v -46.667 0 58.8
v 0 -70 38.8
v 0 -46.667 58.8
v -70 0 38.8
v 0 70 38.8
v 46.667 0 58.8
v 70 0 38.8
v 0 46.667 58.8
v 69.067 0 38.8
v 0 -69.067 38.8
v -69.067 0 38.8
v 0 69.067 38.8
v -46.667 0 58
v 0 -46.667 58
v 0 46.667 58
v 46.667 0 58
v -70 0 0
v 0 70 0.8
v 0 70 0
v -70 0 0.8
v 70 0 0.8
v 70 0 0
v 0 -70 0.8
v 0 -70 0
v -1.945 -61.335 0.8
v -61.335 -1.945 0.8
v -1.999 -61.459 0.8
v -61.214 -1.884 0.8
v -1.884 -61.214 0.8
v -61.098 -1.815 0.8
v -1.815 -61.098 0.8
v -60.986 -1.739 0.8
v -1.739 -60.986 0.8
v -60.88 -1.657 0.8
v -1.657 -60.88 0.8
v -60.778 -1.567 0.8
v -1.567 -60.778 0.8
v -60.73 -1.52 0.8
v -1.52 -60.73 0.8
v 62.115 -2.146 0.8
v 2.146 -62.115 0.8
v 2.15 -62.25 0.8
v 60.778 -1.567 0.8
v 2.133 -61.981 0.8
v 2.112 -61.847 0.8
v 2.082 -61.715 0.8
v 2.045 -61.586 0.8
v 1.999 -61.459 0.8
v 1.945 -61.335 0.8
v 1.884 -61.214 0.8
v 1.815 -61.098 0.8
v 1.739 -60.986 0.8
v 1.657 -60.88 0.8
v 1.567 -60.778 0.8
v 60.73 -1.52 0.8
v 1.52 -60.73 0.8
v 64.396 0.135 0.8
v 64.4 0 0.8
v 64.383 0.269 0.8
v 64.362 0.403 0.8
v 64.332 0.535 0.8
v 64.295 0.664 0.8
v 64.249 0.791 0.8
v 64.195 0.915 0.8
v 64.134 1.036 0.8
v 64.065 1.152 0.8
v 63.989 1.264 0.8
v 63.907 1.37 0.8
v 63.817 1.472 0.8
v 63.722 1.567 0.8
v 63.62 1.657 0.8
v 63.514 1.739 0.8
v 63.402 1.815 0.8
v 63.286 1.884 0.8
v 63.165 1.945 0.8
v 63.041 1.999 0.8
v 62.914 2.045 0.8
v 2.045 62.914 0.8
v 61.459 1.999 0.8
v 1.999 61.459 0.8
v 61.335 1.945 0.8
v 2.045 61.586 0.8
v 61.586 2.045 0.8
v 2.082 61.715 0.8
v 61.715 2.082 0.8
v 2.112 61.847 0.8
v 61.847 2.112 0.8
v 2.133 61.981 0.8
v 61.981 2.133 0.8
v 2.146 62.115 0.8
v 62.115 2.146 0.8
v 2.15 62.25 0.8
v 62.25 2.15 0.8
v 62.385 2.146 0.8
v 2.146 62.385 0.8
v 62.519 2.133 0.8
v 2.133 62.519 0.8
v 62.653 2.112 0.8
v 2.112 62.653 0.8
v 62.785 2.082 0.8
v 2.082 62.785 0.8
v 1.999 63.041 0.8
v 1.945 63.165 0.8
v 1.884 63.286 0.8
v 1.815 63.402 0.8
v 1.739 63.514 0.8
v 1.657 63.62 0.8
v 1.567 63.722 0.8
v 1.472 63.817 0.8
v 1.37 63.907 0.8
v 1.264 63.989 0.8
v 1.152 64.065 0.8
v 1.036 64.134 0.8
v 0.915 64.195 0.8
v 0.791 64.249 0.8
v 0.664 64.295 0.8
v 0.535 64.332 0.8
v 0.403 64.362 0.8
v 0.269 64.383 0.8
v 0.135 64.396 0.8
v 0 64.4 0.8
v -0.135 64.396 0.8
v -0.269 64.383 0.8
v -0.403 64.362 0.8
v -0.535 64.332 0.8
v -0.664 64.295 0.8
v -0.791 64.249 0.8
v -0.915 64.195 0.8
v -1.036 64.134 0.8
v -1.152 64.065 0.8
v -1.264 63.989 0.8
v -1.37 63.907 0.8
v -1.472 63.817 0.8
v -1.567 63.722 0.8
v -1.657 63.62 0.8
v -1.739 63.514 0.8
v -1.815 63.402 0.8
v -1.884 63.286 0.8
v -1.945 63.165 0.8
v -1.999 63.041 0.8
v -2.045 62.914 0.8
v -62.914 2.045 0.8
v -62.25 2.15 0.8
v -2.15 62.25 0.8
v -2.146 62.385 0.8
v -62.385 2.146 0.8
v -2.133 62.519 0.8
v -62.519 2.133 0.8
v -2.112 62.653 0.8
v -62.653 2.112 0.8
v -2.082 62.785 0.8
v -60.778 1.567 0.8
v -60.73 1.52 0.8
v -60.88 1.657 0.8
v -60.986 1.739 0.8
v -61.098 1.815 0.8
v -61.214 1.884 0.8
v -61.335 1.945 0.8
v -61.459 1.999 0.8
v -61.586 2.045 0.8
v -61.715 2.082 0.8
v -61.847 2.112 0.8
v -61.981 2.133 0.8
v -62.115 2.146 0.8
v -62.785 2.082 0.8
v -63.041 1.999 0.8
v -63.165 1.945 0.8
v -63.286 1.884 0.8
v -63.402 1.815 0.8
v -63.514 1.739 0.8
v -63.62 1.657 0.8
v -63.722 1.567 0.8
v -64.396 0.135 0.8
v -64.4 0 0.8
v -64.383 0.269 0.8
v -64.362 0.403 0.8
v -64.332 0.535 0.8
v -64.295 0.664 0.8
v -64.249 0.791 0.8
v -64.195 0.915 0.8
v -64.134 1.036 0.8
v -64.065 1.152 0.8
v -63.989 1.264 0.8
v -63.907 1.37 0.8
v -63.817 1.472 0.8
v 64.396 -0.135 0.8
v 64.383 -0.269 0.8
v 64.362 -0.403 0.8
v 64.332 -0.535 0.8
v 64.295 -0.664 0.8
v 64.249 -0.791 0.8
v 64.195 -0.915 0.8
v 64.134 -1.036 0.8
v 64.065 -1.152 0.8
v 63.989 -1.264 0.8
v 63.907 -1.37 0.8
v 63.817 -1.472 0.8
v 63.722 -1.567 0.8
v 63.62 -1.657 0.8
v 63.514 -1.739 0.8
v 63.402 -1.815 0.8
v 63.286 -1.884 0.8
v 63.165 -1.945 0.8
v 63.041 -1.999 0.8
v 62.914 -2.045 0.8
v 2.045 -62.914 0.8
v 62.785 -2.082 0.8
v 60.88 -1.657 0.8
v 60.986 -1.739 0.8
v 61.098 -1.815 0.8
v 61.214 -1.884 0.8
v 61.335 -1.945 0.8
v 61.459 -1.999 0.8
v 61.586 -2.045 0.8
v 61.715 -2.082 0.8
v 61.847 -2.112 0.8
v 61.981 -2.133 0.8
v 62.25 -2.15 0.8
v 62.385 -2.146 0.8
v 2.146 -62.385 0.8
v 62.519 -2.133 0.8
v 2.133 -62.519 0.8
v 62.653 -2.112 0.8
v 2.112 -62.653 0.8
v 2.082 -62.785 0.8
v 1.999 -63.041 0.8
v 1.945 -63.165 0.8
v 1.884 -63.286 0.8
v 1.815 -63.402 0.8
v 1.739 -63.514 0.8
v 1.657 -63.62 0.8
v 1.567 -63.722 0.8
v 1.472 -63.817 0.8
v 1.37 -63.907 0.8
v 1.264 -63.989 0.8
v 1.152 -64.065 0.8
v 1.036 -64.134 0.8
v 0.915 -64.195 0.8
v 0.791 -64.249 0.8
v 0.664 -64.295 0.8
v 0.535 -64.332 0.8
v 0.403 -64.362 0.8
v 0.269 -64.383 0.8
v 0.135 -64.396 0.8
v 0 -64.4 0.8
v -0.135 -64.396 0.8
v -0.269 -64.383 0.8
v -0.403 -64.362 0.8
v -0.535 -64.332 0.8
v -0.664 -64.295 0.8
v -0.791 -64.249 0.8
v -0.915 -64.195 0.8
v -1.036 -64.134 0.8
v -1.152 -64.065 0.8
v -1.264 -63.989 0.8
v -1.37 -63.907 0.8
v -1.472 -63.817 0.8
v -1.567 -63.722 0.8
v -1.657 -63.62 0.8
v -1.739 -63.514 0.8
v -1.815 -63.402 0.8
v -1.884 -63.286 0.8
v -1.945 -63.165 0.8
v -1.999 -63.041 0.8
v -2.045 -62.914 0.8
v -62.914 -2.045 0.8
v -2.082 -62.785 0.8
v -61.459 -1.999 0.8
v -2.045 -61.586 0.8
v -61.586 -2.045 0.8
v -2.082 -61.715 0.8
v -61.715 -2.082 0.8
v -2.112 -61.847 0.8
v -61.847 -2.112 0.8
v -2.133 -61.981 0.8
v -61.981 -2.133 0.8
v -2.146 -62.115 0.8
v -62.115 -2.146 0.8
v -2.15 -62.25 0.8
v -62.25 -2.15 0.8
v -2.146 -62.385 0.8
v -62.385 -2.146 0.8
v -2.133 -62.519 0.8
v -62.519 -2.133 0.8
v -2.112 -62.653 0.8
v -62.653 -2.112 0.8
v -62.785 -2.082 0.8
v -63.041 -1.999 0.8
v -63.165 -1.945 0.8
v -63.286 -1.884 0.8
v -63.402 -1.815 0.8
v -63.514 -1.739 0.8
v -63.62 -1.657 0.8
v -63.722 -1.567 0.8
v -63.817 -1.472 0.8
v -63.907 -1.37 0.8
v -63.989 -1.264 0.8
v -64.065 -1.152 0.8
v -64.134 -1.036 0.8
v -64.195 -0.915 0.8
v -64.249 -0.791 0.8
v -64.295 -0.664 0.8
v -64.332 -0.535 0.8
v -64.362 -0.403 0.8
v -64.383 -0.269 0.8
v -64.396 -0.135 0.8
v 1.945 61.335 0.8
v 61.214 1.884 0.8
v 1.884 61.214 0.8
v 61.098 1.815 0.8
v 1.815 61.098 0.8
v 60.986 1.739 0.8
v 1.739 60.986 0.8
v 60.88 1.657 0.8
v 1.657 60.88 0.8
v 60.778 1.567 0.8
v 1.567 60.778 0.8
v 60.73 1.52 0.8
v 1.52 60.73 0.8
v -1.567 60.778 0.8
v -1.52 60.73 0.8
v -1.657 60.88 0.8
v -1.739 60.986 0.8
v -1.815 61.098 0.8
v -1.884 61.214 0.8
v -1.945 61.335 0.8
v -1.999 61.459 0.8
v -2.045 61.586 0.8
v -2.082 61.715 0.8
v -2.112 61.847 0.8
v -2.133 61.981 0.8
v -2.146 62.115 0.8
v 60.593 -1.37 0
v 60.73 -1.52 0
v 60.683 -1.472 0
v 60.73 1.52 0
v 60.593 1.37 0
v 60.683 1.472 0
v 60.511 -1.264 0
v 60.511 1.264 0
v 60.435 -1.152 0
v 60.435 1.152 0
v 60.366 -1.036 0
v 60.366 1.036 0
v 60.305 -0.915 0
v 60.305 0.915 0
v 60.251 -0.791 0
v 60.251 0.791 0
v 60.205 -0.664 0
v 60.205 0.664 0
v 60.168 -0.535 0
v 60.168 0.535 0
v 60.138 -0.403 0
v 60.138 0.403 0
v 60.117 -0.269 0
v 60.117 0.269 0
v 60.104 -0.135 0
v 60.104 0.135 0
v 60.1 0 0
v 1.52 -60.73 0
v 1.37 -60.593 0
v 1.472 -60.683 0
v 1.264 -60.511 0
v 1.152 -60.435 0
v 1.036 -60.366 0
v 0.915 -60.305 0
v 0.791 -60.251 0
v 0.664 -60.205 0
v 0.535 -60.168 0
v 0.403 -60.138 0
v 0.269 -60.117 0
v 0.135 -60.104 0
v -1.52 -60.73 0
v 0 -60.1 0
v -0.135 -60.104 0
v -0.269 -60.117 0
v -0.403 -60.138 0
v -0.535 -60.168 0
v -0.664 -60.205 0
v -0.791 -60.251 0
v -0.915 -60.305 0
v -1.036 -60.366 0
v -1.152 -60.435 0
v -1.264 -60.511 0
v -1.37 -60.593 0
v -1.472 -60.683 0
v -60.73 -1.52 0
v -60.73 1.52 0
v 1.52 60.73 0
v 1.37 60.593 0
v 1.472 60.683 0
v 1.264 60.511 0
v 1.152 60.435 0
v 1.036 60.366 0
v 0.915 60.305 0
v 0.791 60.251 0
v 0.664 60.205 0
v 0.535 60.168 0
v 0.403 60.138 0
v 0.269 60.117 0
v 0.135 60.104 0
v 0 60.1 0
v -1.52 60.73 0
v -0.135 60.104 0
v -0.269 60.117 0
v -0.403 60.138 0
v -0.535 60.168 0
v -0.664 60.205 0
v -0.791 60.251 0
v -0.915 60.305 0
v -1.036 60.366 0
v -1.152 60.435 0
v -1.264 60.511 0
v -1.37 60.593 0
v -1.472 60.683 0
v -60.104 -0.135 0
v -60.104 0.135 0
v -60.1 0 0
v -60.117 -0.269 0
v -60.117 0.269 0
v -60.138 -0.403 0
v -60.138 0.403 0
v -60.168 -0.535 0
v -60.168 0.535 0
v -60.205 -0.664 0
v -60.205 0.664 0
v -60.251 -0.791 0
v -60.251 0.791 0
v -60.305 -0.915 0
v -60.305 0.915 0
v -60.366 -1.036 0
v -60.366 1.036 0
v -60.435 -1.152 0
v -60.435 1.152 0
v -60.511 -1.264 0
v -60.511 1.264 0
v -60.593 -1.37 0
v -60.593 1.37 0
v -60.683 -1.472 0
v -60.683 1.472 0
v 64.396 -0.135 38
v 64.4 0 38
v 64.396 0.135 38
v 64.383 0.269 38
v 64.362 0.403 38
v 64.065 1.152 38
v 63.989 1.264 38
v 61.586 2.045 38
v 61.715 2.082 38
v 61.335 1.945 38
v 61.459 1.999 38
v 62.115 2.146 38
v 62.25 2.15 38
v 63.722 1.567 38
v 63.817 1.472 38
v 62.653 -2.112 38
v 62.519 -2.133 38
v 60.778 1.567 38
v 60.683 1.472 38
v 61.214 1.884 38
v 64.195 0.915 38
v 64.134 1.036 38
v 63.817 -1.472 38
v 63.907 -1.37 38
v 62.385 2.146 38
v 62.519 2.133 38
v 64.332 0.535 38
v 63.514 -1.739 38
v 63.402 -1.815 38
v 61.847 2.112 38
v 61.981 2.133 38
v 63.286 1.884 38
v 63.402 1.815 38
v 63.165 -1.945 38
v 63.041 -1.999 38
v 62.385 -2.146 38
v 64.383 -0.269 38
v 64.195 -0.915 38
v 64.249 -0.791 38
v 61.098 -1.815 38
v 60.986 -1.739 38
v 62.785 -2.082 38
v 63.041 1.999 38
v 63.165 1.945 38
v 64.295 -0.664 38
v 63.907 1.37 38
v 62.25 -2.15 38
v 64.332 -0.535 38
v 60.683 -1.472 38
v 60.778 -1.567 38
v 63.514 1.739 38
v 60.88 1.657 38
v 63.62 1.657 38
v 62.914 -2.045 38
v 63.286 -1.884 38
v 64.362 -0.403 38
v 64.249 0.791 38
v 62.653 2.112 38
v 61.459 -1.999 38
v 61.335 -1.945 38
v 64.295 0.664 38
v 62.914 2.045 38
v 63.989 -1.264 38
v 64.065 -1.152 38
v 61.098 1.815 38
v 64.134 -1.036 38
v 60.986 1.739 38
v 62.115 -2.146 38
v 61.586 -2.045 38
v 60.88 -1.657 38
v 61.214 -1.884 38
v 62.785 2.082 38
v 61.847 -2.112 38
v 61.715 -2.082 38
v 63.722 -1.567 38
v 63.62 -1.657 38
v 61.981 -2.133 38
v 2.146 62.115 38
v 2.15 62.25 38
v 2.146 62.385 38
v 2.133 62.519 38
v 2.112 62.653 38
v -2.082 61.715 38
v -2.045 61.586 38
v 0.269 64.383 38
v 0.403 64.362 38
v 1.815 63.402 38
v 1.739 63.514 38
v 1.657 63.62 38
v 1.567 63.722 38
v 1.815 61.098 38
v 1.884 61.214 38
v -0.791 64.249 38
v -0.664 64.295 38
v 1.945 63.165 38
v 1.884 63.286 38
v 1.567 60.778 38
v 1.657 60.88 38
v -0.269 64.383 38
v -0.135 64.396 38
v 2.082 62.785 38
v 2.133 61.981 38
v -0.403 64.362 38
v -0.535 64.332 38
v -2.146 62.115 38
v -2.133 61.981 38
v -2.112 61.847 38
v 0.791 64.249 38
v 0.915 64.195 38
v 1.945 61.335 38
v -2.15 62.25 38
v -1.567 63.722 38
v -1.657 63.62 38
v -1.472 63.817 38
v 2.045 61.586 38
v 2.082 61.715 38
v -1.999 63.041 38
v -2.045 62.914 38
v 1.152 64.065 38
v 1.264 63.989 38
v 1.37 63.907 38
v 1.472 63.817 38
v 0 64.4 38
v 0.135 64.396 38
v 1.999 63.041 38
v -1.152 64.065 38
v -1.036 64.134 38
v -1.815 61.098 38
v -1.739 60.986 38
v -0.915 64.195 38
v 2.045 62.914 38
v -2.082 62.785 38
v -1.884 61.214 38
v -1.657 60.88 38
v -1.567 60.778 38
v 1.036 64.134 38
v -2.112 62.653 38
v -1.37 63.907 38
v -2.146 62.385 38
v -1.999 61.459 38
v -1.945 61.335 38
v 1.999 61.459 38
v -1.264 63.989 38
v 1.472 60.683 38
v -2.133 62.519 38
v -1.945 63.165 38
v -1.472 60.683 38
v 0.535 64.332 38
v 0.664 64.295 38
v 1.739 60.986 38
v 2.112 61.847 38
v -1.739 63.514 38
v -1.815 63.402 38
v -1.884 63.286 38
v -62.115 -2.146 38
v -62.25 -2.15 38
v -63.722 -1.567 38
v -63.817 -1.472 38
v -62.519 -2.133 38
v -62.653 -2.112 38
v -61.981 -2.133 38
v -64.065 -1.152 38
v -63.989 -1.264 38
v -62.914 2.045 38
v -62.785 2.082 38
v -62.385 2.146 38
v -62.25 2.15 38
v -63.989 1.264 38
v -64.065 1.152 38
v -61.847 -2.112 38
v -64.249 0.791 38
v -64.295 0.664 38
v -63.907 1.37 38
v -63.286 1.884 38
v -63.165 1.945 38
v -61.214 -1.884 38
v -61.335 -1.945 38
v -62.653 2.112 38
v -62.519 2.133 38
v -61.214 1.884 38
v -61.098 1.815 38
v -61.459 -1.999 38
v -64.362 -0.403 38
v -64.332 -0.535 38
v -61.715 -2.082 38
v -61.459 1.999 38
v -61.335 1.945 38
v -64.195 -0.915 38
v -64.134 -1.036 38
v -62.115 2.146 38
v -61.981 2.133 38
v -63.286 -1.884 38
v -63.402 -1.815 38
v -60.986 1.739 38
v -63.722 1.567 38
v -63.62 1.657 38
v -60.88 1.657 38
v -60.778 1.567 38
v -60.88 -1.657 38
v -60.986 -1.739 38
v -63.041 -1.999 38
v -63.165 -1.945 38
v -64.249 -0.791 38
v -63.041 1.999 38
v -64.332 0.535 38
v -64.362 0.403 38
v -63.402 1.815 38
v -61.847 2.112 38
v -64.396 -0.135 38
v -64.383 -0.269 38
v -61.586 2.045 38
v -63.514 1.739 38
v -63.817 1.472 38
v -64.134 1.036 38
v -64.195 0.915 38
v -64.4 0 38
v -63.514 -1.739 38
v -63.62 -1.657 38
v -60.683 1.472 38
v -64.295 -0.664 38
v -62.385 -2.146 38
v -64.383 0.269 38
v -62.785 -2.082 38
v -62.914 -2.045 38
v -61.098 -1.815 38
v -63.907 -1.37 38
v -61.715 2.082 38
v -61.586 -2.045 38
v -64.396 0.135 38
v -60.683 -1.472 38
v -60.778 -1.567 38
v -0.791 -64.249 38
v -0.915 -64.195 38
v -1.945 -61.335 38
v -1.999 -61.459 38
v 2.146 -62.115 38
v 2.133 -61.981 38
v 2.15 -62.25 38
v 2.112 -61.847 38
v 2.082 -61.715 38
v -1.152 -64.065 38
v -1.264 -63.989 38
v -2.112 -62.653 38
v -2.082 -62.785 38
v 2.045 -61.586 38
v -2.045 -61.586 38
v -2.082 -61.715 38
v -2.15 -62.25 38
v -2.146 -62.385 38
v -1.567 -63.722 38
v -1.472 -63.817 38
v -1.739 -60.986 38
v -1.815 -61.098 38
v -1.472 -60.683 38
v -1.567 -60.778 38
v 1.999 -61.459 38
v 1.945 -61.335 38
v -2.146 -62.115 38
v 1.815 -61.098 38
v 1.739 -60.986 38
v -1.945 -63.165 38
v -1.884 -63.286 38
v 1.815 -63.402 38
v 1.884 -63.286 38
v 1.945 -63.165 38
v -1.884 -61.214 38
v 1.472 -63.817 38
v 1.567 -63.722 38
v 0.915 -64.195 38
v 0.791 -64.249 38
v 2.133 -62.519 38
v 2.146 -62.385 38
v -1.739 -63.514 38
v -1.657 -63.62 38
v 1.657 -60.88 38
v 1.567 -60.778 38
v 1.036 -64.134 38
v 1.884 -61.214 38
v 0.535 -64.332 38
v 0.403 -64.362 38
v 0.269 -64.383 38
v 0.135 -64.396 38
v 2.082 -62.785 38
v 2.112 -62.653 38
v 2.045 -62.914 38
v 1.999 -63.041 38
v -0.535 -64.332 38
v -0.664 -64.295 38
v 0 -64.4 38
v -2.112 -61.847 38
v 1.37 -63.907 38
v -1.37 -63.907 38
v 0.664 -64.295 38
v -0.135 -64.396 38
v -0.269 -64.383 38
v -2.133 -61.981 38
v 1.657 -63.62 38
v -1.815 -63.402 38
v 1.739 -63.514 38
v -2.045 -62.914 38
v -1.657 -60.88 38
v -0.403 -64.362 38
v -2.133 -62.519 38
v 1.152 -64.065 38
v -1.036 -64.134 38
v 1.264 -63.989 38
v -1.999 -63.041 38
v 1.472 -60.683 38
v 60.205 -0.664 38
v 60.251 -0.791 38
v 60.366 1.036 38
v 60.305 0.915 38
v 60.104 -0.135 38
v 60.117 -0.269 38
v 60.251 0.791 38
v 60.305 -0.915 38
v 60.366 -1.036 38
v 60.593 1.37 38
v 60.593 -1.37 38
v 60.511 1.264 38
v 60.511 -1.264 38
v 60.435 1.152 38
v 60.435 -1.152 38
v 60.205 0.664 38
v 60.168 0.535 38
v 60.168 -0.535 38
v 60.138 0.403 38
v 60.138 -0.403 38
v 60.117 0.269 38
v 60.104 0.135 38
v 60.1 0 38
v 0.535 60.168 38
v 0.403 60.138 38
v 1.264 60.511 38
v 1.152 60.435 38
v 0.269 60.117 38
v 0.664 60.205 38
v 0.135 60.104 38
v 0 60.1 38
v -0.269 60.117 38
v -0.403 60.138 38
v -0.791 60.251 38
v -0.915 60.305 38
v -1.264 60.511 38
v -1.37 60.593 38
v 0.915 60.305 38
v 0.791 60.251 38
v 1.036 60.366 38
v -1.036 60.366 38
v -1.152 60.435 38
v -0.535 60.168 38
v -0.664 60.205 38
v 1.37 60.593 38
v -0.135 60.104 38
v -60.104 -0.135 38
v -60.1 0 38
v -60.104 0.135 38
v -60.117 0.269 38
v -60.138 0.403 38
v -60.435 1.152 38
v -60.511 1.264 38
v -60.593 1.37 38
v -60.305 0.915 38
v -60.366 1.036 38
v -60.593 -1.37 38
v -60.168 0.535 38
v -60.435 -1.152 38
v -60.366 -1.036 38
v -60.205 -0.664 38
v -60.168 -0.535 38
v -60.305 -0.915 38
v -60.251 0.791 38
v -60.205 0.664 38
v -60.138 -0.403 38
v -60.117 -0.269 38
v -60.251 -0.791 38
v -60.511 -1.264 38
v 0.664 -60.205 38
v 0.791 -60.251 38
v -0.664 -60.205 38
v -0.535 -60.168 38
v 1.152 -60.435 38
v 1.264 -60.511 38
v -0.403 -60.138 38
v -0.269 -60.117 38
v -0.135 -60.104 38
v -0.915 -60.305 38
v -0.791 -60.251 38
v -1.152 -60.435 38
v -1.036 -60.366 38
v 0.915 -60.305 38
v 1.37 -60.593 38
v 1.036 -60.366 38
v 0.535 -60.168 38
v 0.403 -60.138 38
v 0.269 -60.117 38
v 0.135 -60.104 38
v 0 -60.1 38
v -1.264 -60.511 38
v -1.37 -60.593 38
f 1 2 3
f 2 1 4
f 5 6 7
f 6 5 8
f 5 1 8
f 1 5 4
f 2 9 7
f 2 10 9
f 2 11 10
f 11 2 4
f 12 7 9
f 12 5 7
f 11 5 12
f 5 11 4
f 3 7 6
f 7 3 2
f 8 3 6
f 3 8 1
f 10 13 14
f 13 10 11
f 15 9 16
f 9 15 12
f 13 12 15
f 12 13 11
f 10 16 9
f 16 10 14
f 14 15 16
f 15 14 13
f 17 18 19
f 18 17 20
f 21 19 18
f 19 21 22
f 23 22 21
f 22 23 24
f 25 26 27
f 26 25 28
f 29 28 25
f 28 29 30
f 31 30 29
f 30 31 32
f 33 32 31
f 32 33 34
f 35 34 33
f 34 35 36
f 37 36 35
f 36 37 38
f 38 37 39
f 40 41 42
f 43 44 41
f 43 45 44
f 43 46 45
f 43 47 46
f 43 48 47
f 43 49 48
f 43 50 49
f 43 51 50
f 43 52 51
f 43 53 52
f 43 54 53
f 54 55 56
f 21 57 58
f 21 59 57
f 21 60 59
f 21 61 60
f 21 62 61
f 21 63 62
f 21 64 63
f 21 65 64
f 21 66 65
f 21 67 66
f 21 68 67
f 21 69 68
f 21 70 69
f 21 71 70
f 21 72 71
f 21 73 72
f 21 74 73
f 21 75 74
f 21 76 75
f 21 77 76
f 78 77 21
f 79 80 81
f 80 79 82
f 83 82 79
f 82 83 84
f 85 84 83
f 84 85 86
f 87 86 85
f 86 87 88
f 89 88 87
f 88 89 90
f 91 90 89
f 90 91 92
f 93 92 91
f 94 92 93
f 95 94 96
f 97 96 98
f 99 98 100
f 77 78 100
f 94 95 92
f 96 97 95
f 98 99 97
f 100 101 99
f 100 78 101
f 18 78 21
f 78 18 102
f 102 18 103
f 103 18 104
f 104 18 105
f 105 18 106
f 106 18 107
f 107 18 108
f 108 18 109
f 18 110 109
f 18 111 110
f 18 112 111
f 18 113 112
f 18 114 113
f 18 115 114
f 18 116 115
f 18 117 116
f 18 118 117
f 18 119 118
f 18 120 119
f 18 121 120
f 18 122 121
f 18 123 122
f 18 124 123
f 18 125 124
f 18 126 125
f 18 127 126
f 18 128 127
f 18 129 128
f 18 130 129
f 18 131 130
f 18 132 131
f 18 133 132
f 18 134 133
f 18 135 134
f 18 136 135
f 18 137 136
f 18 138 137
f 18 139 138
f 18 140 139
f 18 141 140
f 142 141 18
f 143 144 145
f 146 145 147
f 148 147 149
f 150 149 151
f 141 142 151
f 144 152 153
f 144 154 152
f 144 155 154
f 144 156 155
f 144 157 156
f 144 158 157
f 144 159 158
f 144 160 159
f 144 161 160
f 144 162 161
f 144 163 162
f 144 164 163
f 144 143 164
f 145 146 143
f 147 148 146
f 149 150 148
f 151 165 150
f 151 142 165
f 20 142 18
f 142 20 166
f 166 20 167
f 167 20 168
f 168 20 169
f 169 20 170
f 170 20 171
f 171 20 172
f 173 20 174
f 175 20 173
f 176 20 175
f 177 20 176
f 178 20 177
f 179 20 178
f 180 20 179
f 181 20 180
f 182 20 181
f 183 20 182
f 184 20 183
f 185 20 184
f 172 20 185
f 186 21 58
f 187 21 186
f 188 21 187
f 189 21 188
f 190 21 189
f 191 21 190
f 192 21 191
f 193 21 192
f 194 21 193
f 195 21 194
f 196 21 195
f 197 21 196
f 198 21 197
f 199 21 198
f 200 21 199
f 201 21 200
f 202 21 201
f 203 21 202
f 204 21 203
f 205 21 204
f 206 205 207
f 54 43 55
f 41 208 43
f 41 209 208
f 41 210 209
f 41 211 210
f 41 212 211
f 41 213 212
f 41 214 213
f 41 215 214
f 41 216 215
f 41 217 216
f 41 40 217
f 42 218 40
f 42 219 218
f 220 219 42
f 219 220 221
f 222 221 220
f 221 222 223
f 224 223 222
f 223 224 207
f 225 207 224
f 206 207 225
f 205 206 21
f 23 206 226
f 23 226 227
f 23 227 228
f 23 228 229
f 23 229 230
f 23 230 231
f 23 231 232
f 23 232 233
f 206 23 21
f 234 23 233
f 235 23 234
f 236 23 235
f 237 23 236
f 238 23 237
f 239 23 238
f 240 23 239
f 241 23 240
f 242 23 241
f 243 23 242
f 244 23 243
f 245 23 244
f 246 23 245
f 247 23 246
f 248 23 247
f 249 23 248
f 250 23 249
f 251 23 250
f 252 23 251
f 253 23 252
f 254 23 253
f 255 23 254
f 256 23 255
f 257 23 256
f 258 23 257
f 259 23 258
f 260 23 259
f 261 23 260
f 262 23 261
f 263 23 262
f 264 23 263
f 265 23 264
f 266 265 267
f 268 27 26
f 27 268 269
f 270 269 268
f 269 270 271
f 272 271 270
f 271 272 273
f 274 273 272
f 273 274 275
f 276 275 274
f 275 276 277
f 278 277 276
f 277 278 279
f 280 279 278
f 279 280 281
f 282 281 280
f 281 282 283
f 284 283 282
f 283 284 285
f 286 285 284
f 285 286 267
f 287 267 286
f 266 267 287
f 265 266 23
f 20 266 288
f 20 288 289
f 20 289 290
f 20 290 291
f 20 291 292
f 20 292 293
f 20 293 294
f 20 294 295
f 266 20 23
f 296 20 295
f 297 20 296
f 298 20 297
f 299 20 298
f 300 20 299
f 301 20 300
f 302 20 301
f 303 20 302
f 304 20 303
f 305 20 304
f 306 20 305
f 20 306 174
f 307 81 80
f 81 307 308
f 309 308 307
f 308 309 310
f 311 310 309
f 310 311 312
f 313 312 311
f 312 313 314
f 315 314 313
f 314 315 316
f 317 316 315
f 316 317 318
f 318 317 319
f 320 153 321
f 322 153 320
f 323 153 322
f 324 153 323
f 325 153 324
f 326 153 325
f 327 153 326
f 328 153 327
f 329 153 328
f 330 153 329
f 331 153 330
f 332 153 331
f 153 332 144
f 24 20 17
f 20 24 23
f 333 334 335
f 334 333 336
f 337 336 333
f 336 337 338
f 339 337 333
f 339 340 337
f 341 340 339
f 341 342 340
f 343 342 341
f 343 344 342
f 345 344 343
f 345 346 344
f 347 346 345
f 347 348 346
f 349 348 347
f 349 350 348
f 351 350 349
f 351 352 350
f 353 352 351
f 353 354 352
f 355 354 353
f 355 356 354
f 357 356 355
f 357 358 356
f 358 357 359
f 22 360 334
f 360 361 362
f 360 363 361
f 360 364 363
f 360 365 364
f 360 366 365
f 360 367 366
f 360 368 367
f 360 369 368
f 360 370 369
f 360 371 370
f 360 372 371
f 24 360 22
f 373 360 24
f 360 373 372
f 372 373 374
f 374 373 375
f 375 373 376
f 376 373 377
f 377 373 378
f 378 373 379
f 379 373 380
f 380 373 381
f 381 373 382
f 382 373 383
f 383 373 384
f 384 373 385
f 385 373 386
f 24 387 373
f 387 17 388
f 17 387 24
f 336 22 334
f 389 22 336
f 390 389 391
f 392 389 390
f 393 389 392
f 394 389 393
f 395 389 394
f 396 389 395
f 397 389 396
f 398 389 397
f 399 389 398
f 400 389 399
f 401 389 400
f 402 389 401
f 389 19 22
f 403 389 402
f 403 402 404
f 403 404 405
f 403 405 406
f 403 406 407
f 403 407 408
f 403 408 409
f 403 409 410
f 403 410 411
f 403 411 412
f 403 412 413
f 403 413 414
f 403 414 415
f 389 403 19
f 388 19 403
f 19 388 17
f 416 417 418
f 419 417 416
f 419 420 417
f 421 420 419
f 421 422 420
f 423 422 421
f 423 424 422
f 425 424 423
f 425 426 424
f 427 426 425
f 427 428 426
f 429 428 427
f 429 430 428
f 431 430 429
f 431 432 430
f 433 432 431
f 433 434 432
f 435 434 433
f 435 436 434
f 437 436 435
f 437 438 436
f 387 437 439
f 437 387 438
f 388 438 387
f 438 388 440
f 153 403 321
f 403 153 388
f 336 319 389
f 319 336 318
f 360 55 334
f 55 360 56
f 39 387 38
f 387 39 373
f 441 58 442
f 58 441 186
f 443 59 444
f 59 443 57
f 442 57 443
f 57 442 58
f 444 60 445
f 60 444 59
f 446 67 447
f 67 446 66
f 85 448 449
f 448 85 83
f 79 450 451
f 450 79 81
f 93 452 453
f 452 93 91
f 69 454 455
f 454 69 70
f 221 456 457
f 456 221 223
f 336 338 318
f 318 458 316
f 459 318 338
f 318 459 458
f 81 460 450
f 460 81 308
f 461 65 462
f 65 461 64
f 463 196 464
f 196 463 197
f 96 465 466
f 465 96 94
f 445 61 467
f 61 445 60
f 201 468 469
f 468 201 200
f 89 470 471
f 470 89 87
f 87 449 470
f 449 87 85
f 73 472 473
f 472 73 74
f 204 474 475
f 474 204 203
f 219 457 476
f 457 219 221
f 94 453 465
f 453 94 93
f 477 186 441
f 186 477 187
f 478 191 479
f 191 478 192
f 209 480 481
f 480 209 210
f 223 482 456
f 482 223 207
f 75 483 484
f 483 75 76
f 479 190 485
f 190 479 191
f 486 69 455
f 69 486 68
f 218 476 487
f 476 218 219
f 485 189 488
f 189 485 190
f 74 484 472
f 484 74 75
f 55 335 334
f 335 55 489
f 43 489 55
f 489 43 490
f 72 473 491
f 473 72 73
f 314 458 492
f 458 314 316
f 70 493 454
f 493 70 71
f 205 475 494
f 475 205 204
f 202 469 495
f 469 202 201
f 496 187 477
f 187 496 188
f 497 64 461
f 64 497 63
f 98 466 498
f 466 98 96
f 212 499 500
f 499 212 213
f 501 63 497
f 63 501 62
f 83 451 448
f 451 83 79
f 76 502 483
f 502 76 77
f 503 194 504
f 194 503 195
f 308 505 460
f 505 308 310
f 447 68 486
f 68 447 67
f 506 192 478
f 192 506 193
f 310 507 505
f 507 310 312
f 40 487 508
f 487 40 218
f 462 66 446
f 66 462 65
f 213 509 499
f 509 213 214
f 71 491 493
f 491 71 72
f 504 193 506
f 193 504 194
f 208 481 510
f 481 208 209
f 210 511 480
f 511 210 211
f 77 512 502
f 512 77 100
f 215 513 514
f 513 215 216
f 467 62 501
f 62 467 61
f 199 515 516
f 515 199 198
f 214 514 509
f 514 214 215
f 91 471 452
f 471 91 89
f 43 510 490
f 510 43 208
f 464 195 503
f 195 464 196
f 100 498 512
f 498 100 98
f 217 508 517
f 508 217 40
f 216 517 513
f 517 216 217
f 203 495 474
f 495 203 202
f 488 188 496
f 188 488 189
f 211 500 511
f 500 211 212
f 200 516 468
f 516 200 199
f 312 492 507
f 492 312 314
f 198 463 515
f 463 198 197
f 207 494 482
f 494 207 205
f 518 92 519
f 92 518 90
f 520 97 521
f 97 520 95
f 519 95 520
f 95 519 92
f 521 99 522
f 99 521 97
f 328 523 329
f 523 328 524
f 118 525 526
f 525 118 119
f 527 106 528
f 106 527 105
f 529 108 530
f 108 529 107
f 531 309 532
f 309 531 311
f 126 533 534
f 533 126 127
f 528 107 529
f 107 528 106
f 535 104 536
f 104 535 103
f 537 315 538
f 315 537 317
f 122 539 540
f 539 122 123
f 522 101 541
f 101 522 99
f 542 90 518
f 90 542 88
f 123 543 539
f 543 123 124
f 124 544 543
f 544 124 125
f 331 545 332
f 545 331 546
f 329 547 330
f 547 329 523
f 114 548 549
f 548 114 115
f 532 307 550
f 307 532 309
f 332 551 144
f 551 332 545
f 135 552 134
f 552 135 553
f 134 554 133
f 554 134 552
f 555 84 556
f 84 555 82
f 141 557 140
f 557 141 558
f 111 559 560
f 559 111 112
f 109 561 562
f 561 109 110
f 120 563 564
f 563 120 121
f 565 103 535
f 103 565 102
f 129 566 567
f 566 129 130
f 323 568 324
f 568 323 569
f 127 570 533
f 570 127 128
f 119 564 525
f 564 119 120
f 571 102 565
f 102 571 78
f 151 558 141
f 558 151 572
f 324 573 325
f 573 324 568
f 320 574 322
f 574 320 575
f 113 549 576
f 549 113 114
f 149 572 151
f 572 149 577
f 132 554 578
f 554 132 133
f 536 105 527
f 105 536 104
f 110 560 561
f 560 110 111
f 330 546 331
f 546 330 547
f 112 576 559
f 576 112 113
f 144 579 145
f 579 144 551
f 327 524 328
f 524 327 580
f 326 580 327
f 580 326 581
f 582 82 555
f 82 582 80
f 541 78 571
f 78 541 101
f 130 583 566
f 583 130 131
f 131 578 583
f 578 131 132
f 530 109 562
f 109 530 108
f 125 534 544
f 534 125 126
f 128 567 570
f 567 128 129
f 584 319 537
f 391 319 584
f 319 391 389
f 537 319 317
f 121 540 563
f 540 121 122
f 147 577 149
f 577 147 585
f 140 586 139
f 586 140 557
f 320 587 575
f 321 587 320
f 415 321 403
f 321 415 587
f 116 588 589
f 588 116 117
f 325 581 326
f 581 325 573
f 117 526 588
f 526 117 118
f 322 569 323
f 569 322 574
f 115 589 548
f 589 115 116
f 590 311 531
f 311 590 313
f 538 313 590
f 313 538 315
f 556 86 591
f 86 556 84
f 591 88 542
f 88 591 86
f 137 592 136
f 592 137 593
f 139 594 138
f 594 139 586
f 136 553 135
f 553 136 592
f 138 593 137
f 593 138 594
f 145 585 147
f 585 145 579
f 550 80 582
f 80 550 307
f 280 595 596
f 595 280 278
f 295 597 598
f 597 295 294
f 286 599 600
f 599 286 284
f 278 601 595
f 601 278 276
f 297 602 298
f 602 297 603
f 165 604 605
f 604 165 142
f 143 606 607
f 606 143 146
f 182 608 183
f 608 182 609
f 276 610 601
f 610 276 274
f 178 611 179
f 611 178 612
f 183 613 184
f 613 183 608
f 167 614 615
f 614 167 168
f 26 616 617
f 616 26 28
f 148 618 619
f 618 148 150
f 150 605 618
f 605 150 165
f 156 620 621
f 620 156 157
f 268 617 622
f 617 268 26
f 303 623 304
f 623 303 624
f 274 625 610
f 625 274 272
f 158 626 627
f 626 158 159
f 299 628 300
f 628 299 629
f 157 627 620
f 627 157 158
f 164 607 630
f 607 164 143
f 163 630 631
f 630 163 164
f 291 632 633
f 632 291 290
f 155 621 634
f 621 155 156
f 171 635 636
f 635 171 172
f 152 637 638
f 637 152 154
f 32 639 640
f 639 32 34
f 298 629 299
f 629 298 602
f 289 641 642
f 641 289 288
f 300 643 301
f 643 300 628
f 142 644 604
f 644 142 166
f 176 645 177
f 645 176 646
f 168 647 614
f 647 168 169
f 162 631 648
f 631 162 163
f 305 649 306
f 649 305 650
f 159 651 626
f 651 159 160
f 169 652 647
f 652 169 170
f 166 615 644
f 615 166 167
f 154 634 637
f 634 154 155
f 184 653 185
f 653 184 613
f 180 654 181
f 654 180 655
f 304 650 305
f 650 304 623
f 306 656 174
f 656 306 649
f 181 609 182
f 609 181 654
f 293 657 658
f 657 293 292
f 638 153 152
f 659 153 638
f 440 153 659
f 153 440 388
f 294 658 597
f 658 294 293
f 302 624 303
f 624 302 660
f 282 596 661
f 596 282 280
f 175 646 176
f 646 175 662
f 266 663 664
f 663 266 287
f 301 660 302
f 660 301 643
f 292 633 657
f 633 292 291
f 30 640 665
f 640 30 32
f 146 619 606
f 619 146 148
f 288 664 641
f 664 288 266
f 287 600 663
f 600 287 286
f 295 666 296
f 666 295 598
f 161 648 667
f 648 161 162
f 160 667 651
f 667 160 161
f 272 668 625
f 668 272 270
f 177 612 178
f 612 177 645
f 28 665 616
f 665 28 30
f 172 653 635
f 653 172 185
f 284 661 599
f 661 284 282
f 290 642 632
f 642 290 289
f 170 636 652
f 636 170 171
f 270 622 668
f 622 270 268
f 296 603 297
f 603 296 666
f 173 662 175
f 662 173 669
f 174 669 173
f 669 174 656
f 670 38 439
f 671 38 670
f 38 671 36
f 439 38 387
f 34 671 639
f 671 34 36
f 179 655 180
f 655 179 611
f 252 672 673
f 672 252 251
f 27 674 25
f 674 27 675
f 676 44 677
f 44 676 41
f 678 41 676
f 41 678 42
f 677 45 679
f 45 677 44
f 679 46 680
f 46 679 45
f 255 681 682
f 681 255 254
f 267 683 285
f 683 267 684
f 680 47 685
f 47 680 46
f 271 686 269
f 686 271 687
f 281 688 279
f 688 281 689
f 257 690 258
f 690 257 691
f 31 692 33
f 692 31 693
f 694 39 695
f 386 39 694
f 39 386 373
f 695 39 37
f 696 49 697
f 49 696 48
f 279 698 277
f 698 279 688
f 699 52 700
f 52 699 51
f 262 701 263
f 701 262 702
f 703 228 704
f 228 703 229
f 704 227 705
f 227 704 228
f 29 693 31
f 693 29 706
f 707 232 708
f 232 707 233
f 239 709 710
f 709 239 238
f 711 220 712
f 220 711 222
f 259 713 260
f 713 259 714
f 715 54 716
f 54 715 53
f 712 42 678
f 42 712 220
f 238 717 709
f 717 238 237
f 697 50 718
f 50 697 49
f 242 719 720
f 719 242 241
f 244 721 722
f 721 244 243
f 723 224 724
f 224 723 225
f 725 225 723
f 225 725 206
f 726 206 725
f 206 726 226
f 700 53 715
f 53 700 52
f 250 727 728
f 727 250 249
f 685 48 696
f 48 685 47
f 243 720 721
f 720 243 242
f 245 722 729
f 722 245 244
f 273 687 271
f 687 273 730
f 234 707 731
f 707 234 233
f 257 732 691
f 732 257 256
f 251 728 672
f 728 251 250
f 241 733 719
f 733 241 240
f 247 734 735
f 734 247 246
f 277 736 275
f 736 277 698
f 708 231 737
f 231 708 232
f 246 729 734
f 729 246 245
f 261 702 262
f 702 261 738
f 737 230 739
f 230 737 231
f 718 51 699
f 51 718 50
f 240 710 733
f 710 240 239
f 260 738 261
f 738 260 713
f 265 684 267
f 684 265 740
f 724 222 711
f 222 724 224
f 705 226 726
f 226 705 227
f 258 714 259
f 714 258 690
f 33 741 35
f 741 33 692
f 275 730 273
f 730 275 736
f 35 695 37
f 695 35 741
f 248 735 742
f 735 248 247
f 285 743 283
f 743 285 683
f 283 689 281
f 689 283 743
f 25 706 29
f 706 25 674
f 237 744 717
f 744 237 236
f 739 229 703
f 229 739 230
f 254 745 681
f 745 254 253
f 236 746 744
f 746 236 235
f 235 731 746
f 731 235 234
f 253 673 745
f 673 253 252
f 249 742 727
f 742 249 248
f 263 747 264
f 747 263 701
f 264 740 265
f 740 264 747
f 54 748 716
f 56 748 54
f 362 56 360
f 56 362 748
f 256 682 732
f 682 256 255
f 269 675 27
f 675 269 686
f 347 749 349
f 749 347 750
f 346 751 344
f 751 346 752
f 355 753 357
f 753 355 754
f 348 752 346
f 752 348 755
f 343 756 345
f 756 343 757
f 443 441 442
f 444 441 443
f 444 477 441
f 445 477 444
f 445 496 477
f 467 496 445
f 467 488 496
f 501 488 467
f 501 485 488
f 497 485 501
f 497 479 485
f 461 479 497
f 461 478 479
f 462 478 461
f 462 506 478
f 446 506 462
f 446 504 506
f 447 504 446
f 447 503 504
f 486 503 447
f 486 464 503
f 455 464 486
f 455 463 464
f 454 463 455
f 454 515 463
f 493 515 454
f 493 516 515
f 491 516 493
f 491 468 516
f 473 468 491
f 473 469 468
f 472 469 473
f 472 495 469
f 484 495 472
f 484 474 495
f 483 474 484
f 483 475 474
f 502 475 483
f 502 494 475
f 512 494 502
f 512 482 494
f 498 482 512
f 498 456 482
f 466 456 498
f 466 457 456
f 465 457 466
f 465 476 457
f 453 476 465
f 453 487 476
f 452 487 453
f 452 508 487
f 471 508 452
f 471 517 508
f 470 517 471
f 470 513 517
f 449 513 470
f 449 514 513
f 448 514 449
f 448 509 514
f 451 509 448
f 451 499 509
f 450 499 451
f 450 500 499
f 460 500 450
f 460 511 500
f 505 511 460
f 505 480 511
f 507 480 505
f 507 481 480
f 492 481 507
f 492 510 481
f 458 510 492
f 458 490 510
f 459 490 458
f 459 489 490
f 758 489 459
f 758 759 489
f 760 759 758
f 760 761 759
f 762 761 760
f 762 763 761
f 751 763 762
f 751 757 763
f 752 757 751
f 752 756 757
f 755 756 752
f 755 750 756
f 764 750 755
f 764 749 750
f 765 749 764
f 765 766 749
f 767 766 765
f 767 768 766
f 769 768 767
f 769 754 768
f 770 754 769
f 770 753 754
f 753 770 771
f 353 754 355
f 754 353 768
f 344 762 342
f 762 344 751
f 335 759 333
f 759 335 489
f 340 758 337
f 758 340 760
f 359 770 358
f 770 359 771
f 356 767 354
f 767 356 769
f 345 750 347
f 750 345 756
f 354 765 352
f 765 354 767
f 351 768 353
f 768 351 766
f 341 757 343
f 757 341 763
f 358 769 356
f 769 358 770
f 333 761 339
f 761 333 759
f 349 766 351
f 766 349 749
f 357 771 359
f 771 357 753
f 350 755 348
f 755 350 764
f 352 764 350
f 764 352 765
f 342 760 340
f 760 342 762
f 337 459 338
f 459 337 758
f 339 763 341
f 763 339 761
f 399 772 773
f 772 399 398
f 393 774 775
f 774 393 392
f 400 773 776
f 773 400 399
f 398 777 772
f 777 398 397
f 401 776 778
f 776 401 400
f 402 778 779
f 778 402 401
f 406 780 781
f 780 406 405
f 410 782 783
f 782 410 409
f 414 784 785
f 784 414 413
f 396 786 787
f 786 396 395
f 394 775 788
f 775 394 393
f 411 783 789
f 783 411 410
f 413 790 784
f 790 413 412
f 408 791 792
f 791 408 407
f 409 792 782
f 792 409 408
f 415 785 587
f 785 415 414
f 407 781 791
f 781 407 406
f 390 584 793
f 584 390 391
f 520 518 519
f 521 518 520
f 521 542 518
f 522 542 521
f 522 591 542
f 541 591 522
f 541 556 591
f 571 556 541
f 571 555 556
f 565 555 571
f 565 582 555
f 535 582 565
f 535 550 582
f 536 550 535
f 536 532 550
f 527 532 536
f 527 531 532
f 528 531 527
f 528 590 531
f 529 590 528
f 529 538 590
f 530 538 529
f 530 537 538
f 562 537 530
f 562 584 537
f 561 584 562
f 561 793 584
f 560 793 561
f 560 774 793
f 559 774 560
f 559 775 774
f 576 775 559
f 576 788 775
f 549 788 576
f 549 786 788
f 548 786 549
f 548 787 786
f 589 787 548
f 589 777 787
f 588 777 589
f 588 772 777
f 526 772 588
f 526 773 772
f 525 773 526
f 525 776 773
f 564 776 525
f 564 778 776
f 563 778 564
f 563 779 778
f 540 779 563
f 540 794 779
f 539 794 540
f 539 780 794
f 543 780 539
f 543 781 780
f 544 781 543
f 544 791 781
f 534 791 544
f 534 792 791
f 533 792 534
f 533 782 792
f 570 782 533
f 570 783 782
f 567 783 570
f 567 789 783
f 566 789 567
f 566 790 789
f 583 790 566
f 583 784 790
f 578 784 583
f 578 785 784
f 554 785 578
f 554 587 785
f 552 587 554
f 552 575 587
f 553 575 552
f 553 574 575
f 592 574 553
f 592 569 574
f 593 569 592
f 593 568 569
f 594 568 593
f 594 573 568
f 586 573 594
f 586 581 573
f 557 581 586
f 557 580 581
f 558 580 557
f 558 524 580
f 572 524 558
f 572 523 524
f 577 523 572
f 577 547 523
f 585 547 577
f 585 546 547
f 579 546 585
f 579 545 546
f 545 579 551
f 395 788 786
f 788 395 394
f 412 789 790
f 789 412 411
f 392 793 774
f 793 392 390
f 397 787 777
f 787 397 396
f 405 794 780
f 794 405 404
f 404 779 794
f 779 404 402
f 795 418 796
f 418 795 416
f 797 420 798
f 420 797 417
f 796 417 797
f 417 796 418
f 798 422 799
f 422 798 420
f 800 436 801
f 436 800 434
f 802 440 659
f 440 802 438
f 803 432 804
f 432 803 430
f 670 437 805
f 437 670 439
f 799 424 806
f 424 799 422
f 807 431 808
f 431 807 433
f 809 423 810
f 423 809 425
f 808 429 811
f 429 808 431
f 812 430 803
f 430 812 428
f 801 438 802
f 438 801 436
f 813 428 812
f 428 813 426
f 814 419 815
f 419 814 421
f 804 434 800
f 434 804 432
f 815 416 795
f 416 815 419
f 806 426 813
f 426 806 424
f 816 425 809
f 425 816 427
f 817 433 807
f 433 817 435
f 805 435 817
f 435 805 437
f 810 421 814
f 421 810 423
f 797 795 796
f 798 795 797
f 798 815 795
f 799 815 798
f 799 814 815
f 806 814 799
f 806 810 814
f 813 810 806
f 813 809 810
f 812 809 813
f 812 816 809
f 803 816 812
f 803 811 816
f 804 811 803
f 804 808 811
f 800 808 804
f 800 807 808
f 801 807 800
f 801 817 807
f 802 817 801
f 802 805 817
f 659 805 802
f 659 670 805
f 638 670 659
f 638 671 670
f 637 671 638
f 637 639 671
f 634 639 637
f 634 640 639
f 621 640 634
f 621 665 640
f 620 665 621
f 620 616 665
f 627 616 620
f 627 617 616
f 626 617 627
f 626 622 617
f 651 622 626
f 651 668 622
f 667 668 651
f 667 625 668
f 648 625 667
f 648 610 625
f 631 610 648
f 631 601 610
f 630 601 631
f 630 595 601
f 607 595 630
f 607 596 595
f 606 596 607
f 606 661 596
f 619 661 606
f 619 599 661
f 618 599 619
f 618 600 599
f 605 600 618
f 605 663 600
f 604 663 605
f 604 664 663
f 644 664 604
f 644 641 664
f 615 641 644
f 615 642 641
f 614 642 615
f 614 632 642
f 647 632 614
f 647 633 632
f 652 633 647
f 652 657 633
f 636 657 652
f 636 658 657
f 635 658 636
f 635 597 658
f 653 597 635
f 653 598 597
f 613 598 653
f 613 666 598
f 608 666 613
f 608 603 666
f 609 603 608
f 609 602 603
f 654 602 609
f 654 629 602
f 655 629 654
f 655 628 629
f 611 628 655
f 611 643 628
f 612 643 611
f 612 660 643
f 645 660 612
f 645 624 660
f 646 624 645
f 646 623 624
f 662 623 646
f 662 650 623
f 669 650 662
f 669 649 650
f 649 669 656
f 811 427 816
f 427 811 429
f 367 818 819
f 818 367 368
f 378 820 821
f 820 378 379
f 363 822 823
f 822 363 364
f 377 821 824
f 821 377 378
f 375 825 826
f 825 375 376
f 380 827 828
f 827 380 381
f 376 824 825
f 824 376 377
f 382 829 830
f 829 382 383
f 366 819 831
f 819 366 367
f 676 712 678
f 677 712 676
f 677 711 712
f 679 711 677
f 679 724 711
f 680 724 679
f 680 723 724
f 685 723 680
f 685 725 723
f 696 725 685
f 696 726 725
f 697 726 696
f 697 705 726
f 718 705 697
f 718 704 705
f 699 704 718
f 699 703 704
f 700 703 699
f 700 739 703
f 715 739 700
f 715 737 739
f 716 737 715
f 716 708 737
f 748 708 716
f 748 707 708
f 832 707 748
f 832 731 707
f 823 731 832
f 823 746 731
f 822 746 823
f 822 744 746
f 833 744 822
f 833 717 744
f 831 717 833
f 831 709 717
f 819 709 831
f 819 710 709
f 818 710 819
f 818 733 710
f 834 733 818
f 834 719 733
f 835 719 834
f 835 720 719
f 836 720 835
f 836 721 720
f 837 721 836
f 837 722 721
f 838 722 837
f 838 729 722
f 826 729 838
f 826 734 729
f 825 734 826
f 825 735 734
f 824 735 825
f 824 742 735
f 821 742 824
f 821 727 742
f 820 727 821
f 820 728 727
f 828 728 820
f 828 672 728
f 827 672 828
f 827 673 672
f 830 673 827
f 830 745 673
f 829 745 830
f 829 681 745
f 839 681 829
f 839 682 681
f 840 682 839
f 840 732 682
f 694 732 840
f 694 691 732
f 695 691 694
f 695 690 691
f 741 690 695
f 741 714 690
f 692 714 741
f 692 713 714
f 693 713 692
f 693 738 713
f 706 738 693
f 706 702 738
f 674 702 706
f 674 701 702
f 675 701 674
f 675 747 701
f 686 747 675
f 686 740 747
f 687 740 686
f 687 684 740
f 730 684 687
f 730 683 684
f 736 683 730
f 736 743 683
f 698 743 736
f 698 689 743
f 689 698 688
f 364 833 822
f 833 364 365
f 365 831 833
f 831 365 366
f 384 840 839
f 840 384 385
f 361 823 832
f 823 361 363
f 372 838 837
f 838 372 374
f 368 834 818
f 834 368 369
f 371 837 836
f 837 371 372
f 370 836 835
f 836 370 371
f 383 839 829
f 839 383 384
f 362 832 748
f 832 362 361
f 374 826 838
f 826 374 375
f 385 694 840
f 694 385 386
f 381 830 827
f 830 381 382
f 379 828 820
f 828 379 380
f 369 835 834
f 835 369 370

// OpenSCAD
$fn=100;
ly = .2;

elevation = 38;
height = 20;

d1 = 140;
d2 = d1-d1/3;

thickness = 4*ly;
screwR = 4.3/2;
D = (140-124.5-screwR*2)/2;

S1 = [d1/2-screwR-D,0,0];
S2 = [0,d1/2-screwR-D,0];
S3 = [-d1/2+screwR+D,0,0];
S4 = [0,-d1/2+screwR+D,0];

M1 = [d1/2-screwR-D,0,0];
M2 = [0,d1/2-screwR-D,0];
M3 = [-d1/2+screwR+D,0,0];
M4 = [0,-d1/2+screwR+D,0];

    difference() {
        union() {
            translate([0,0,elevation]) {
                difference() {
                    translate([0,0,thickness]) cylinder(h=height,r1=d1/2,r2=d2/2,$fn=4);
                    cylinder(h=height,r1=d1/2,r2=d2/2,$fn=4);
                }
            }
            translate(M1) cylinder(h=elevation,r1=screwR,r2=screwR);
            translate(M2) cylinder(h=elevation,r1=screwR,r2=screwR);
            translate(M3) cylinder(h=elevation,r1=screwR,r2=screwR);
            translate(M4) cylinder(h=elevation,r1=screwR,r2=screwR);
            difference() {
                cylinder(h=thickness,r1=d1/2,r2=d1/2,$fn=4);
                translate([0,0,0]) cylinder(h=thickness,r1=d1/2-screwR-D,r2=d1/2-screwR-D,$fn=4);
                translate(S1) cylinder(h=thickness,r1=screwR,r2=screwR);
                translate(S2) cylinder(h=thickness,r1=screwR,r2=screwR);
                translate(S3) cylinder(h=thickness,r1=screwR,r2=screwR);
                translate(S4) cylinder(h=thickness,r1=screwR,r2=screwR);
            }
        }
    }
